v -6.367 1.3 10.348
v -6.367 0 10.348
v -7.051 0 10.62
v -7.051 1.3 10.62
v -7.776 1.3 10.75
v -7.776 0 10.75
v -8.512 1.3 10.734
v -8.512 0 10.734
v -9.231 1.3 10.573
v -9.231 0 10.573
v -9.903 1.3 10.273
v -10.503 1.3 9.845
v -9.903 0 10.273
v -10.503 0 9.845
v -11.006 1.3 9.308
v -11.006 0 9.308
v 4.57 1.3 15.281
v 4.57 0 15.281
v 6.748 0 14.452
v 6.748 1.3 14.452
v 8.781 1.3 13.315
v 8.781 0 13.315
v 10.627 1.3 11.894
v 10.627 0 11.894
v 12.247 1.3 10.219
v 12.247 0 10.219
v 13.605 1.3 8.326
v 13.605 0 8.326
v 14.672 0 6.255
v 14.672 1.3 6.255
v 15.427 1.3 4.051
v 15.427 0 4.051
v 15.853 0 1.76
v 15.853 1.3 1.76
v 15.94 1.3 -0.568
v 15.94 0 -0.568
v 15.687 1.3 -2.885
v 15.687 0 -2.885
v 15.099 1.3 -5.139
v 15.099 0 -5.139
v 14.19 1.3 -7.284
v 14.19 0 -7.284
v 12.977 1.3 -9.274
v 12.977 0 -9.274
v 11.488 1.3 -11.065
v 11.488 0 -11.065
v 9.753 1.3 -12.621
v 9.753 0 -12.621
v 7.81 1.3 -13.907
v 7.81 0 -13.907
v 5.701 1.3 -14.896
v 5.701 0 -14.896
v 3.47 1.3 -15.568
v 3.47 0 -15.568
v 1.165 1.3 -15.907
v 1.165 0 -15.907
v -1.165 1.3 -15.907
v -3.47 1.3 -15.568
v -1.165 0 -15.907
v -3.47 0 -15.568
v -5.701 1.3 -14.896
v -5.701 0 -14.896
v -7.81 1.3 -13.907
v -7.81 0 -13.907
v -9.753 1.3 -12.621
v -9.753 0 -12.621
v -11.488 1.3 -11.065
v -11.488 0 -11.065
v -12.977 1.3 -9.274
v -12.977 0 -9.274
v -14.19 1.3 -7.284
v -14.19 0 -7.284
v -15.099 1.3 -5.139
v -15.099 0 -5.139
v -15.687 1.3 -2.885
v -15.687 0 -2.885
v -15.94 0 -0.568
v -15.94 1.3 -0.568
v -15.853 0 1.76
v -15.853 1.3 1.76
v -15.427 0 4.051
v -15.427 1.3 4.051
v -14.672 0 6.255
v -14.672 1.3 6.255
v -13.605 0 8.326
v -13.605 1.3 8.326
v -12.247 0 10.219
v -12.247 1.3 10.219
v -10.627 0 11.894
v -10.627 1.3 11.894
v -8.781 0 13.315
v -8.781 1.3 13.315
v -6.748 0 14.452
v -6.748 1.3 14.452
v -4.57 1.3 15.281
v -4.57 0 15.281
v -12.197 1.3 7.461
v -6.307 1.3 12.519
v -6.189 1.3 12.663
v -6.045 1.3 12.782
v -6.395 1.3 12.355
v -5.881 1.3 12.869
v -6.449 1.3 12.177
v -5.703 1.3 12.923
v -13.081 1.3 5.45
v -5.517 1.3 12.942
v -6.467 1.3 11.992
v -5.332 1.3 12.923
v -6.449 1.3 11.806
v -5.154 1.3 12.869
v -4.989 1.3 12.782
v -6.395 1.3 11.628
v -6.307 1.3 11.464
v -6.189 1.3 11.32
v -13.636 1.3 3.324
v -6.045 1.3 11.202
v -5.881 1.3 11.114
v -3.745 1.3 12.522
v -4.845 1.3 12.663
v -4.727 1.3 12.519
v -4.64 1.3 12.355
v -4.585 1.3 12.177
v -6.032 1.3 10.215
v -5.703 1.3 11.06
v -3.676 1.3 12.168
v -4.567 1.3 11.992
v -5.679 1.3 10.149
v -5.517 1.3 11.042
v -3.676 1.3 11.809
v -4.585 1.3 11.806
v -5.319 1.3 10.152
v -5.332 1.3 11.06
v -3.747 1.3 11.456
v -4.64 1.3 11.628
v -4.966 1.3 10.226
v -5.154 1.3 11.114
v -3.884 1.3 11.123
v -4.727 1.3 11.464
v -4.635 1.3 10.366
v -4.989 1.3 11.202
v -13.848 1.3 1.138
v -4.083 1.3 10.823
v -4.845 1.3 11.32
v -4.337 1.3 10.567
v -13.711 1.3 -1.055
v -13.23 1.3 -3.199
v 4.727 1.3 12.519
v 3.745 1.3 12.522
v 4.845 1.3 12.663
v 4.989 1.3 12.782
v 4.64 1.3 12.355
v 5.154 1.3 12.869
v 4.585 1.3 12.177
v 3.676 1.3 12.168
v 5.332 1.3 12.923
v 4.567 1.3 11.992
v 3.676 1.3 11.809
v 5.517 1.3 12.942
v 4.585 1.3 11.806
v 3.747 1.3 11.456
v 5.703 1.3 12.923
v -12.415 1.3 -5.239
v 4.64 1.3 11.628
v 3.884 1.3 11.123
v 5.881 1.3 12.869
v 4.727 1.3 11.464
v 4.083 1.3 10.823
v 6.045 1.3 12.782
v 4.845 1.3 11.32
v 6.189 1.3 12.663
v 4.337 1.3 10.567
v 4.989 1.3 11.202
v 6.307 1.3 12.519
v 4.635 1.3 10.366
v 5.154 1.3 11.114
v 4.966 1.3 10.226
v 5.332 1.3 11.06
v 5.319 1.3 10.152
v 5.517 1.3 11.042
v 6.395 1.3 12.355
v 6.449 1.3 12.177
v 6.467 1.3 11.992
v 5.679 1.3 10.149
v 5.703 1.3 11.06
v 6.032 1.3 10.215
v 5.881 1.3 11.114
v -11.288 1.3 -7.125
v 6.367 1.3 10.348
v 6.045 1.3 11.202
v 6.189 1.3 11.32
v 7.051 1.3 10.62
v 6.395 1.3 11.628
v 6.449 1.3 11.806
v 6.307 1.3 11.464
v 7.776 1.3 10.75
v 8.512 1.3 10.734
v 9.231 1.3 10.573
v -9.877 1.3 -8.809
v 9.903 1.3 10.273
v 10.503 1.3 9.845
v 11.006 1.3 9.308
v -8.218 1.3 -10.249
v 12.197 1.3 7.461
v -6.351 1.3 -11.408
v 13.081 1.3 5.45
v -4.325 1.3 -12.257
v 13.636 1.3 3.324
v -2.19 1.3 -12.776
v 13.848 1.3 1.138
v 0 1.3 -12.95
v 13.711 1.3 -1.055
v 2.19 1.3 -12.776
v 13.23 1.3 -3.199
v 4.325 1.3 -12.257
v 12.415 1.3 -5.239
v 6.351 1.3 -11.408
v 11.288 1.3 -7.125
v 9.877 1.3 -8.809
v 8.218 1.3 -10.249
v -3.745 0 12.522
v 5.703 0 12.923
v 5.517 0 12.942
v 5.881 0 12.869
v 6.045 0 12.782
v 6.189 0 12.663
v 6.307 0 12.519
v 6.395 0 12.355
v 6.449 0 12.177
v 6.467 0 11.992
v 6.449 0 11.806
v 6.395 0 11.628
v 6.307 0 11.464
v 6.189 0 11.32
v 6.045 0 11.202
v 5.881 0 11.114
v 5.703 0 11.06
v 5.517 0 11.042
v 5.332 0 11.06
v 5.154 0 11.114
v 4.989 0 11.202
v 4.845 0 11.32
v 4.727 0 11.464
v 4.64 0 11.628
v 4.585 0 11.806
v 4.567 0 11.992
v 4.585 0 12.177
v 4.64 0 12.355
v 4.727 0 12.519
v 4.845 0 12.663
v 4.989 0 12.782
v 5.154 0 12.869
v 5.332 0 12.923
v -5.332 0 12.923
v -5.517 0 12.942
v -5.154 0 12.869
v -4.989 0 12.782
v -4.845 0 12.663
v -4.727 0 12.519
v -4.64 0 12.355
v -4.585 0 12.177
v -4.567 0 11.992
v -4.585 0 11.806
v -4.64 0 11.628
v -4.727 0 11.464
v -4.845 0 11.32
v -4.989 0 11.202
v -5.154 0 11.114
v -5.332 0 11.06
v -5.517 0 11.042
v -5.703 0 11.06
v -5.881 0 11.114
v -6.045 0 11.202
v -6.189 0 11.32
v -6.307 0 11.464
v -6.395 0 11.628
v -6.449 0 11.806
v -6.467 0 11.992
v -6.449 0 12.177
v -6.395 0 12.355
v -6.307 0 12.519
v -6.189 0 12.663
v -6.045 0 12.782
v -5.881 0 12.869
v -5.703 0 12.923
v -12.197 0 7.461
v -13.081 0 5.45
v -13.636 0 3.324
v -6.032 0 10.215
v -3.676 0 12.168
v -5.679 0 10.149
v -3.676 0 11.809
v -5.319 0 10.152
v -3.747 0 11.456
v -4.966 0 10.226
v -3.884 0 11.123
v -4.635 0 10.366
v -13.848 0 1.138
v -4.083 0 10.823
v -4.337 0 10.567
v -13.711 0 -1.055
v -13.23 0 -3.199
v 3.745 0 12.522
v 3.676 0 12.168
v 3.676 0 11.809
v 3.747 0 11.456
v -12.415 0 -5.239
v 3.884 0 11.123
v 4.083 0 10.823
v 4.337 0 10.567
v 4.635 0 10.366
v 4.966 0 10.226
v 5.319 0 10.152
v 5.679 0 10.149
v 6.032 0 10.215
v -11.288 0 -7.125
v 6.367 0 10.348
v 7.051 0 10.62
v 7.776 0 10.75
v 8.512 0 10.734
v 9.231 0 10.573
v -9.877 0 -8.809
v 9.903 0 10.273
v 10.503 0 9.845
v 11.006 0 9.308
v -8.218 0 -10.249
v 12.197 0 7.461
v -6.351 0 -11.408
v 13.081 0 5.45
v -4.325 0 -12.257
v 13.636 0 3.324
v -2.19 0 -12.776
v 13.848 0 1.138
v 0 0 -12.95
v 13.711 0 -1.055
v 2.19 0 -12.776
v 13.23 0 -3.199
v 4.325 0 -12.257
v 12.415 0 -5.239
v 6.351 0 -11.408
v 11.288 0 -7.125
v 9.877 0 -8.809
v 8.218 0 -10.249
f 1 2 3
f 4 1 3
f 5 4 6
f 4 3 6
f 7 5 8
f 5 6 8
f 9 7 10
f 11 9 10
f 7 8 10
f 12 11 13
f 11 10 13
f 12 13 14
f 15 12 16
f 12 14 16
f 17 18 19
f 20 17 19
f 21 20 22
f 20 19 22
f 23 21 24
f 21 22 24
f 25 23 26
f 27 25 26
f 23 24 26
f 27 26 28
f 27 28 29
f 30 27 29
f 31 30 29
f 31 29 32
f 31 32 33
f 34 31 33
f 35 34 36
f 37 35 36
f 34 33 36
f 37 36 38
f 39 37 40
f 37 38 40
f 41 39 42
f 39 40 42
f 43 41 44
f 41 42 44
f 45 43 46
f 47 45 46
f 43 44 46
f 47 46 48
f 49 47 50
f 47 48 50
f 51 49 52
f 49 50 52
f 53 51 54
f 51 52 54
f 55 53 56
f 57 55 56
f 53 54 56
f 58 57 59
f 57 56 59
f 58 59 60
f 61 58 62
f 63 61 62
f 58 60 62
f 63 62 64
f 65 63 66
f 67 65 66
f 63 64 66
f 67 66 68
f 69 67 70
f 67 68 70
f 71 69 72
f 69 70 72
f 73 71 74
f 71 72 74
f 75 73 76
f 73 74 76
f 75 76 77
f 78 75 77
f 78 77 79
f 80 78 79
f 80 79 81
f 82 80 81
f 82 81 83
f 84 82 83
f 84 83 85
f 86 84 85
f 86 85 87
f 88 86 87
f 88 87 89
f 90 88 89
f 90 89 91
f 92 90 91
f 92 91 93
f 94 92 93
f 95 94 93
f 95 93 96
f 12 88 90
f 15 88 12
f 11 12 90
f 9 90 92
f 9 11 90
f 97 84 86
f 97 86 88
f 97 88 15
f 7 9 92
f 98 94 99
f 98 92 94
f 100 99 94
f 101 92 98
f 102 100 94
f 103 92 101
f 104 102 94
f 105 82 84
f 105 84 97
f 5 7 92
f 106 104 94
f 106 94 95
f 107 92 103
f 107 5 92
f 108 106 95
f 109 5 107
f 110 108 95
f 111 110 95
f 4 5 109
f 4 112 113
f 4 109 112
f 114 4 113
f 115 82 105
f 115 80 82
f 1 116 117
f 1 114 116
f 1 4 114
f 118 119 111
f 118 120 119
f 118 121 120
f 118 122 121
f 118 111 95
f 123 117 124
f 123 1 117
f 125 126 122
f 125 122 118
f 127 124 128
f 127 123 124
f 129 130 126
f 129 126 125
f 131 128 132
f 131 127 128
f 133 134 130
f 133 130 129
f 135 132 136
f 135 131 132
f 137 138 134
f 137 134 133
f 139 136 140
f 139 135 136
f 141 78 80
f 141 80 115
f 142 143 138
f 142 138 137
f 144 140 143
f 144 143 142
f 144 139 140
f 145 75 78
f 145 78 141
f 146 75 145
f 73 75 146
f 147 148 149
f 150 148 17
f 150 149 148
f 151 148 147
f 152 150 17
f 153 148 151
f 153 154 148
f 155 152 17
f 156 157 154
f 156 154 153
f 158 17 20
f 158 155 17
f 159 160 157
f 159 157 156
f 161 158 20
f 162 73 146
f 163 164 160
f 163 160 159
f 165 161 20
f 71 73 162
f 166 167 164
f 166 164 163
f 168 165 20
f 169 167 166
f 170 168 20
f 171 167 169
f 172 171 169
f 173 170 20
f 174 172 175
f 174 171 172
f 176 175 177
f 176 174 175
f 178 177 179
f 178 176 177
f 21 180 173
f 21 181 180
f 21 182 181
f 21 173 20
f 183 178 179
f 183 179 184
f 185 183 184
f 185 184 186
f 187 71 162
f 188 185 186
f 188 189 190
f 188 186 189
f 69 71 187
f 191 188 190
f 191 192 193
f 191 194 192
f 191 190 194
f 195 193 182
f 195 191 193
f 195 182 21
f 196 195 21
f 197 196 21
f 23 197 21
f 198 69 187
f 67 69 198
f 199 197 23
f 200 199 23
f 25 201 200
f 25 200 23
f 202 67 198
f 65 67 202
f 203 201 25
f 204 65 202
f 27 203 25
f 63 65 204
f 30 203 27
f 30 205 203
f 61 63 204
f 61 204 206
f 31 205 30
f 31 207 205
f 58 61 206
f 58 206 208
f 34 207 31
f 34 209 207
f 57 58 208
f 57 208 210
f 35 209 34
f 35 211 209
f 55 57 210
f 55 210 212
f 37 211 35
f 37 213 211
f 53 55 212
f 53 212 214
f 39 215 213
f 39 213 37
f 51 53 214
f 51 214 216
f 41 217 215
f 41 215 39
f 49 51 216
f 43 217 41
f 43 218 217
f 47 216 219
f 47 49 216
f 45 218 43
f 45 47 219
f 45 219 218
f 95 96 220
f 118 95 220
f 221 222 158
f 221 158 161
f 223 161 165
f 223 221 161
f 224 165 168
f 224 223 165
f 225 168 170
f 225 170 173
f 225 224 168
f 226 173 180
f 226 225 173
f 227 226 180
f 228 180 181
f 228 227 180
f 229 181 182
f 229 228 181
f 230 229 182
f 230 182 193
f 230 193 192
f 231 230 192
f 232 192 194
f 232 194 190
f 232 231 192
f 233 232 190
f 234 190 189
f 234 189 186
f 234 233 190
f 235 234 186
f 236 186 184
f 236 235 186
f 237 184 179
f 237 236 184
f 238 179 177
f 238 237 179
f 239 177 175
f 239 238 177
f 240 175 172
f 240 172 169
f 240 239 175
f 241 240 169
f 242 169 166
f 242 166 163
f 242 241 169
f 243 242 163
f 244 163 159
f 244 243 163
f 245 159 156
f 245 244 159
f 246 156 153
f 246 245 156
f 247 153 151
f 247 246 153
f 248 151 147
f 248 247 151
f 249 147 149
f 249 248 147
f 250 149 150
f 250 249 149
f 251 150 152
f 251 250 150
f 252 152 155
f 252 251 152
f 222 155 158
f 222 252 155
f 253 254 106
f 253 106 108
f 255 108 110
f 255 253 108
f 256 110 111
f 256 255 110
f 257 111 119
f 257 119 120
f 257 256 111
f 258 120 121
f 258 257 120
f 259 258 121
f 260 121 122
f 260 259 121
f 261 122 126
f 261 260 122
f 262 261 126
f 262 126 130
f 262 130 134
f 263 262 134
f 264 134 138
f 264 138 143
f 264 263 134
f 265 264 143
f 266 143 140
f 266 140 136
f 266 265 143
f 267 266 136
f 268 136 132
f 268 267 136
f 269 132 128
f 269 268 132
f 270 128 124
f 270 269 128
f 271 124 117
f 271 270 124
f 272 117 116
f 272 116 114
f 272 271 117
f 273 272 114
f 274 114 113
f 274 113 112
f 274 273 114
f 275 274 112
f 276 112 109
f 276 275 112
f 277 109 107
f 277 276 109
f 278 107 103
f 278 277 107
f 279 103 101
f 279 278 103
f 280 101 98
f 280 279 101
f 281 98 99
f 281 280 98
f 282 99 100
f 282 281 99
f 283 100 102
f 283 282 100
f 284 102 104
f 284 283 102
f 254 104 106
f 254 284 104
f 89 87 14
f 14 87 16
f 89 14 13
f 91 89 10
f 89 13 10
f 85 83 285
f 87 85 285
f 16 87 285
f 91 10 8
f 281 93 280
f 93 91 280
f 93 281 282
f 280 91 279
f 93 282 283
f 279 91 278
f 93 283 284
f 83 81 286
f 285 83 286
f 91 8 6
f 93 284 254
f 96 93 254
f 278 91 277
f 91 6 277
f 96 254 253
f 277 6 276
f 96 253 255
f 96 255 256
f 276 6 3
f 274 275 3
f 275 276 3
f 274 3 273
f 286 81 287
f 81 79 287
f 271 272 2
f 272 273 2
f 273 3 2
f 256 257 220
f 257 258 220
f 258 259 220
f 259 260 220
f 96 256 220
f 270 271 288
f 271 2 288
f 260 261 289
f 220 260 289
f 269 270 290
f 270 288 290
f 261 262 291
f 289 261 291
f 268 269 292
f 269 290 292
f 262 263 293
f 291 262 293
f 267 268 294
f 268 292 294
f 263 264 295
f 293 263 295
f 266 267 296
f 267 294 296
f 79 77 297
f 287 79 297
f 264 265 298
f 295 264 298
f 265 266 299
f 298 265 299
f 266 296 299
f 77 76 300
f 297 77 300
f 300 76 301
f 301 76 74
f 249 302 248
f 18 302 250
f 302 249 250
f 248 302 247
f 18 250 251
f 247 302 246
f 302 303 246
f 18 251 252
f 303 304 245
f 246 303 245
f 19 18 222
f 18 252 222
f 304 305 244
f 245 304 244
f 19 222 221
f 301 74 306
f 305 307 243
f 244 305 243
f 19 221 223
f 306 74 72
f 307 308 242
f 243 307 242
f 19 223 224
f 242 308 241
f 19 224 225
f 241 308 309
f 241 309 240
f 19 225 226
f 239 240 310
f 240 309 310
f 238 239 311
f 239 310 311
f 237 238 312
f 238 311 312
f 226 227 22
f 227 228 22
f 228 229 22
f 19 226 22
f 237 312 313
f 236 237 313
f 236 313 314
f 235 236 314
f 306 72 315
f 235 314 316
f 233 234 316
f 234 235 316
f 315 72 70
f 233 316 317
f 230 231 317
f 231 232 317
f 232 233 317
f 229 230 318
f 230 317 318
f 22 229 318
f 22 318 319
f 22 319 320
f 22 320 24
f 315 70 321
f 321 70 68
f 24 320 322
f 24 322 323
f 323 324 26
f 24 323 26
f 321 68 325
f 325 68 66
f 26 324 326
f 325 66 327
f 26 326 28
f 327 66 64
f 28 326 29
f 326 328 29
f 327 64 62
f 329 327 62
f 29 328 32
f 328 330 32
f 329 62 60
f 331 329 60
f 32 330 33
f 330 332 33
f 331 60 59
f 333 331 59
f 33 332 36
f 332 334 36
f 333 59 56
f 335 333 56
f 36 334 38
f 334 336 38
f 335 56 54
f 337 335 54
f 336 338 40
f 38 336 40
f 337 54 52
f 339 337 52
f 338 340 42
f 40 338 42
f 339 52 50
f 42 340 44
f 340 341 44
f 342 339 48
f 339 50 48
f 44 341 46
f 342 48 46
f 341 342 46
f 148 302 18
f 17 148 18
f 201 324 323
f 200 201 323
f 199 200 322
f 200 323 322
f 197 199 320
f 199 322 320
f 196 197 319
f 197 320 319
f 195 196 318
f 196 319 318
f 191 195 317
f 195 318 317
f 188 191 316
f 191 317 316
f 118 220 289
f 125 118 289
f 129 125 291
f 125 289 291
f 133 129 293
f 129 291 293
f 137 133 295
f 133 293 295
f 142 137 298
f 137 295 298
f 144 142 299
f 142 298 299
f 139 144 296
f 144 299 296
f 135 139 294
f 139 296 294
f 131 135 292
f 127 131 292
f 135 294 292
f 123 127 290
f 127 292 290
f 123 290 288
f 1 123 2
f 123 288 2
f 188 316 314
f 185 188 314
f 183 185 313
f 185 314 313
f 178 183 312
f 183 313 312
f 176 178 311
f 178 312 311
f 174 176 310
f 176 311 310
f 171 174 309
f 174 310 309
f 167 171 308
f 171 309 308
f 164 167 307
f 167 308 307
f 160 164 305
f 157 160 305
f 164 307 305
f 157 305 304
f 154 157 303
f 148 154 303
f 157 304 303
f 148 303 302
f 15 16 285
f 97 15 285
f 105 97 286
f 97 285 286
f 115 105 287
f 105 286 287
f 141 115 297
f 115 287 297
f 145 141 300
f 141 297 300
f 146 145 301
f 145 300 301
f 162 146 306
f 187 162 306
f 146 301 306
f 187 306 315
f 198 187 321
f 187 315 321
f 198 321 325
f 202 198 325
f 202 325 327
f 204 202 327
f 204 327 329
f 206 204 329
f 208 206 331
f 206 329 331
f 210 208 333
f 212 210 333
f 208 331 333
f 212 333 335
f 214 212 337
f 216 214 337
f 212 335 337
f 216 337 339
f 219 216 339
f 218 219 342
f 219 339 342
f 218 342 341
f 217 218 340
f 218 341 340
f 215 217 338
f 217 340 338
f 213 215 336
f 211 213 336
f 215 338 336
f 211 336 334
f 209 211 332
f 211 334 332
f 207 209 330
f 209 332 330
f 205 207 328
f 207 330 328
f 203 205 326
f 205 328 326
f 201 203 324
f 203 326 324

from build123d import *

# Parameters (mm, degrees)
SKETCH_1_R      = 0.95
EXTRUDE_1_DEPTH = 1.3


with BuildPart() as part:
    # 草图1 → 凸台-拉伸1 (new body)
    with BuildSketch(Plane(origin=(0, 0, 0), x_dir=(1, 0, 0), z_dir=(0, 1, 0))):
        with BuildLine():
            ThreePointArc((6.366785174, -10.348273625), (4.336586912, -10.567387921), (3.744794787, -12.521741558))
            Line((3.744794787, -12.521741558), (4.570066616, -15.281262746))
            ThreePointArc((4.570066616, -15.281262746), (0, 15.95), (-4.570066616, -15.281262746))
            Line((-4.570066616, -15.281262746), (-3.744794792, -12.521741574))
            ThreePointArc((-3.744794792, -12.521741574), (-4.336586905, -10.567387926), (-6.366785174, -10.348273625))
            ThreePointArc((-6.366785174, -10.348273625), (-8.87577758, -10.671754493), (-11.00617365, -9.30753481))
            ThreePointArc((-11.00617365, -9.30753481), (0, 12.95), (11.00617365, -9.30753481))
            ThreePointArc((11.00617365, -9.30753481), (8.87577758, -10.671754493), (6.366785174, -10.348273625))
        make_face()
        with Locations(Location((5.517229655, -11.991671149, 0), (0, 0, 270))):
            Circle(SKETCH_1_R, mode=Mode.SUBTRACT)
        with Locations(Location((-5.517229655, -11.991671149, 0), (0, 0, 270))):
            Circle(SKETCH_1_R, mode=Mode.SUBTRACT)
    extrude(amount=EXTRUDE_1_DEPTH)


solid = part.part
